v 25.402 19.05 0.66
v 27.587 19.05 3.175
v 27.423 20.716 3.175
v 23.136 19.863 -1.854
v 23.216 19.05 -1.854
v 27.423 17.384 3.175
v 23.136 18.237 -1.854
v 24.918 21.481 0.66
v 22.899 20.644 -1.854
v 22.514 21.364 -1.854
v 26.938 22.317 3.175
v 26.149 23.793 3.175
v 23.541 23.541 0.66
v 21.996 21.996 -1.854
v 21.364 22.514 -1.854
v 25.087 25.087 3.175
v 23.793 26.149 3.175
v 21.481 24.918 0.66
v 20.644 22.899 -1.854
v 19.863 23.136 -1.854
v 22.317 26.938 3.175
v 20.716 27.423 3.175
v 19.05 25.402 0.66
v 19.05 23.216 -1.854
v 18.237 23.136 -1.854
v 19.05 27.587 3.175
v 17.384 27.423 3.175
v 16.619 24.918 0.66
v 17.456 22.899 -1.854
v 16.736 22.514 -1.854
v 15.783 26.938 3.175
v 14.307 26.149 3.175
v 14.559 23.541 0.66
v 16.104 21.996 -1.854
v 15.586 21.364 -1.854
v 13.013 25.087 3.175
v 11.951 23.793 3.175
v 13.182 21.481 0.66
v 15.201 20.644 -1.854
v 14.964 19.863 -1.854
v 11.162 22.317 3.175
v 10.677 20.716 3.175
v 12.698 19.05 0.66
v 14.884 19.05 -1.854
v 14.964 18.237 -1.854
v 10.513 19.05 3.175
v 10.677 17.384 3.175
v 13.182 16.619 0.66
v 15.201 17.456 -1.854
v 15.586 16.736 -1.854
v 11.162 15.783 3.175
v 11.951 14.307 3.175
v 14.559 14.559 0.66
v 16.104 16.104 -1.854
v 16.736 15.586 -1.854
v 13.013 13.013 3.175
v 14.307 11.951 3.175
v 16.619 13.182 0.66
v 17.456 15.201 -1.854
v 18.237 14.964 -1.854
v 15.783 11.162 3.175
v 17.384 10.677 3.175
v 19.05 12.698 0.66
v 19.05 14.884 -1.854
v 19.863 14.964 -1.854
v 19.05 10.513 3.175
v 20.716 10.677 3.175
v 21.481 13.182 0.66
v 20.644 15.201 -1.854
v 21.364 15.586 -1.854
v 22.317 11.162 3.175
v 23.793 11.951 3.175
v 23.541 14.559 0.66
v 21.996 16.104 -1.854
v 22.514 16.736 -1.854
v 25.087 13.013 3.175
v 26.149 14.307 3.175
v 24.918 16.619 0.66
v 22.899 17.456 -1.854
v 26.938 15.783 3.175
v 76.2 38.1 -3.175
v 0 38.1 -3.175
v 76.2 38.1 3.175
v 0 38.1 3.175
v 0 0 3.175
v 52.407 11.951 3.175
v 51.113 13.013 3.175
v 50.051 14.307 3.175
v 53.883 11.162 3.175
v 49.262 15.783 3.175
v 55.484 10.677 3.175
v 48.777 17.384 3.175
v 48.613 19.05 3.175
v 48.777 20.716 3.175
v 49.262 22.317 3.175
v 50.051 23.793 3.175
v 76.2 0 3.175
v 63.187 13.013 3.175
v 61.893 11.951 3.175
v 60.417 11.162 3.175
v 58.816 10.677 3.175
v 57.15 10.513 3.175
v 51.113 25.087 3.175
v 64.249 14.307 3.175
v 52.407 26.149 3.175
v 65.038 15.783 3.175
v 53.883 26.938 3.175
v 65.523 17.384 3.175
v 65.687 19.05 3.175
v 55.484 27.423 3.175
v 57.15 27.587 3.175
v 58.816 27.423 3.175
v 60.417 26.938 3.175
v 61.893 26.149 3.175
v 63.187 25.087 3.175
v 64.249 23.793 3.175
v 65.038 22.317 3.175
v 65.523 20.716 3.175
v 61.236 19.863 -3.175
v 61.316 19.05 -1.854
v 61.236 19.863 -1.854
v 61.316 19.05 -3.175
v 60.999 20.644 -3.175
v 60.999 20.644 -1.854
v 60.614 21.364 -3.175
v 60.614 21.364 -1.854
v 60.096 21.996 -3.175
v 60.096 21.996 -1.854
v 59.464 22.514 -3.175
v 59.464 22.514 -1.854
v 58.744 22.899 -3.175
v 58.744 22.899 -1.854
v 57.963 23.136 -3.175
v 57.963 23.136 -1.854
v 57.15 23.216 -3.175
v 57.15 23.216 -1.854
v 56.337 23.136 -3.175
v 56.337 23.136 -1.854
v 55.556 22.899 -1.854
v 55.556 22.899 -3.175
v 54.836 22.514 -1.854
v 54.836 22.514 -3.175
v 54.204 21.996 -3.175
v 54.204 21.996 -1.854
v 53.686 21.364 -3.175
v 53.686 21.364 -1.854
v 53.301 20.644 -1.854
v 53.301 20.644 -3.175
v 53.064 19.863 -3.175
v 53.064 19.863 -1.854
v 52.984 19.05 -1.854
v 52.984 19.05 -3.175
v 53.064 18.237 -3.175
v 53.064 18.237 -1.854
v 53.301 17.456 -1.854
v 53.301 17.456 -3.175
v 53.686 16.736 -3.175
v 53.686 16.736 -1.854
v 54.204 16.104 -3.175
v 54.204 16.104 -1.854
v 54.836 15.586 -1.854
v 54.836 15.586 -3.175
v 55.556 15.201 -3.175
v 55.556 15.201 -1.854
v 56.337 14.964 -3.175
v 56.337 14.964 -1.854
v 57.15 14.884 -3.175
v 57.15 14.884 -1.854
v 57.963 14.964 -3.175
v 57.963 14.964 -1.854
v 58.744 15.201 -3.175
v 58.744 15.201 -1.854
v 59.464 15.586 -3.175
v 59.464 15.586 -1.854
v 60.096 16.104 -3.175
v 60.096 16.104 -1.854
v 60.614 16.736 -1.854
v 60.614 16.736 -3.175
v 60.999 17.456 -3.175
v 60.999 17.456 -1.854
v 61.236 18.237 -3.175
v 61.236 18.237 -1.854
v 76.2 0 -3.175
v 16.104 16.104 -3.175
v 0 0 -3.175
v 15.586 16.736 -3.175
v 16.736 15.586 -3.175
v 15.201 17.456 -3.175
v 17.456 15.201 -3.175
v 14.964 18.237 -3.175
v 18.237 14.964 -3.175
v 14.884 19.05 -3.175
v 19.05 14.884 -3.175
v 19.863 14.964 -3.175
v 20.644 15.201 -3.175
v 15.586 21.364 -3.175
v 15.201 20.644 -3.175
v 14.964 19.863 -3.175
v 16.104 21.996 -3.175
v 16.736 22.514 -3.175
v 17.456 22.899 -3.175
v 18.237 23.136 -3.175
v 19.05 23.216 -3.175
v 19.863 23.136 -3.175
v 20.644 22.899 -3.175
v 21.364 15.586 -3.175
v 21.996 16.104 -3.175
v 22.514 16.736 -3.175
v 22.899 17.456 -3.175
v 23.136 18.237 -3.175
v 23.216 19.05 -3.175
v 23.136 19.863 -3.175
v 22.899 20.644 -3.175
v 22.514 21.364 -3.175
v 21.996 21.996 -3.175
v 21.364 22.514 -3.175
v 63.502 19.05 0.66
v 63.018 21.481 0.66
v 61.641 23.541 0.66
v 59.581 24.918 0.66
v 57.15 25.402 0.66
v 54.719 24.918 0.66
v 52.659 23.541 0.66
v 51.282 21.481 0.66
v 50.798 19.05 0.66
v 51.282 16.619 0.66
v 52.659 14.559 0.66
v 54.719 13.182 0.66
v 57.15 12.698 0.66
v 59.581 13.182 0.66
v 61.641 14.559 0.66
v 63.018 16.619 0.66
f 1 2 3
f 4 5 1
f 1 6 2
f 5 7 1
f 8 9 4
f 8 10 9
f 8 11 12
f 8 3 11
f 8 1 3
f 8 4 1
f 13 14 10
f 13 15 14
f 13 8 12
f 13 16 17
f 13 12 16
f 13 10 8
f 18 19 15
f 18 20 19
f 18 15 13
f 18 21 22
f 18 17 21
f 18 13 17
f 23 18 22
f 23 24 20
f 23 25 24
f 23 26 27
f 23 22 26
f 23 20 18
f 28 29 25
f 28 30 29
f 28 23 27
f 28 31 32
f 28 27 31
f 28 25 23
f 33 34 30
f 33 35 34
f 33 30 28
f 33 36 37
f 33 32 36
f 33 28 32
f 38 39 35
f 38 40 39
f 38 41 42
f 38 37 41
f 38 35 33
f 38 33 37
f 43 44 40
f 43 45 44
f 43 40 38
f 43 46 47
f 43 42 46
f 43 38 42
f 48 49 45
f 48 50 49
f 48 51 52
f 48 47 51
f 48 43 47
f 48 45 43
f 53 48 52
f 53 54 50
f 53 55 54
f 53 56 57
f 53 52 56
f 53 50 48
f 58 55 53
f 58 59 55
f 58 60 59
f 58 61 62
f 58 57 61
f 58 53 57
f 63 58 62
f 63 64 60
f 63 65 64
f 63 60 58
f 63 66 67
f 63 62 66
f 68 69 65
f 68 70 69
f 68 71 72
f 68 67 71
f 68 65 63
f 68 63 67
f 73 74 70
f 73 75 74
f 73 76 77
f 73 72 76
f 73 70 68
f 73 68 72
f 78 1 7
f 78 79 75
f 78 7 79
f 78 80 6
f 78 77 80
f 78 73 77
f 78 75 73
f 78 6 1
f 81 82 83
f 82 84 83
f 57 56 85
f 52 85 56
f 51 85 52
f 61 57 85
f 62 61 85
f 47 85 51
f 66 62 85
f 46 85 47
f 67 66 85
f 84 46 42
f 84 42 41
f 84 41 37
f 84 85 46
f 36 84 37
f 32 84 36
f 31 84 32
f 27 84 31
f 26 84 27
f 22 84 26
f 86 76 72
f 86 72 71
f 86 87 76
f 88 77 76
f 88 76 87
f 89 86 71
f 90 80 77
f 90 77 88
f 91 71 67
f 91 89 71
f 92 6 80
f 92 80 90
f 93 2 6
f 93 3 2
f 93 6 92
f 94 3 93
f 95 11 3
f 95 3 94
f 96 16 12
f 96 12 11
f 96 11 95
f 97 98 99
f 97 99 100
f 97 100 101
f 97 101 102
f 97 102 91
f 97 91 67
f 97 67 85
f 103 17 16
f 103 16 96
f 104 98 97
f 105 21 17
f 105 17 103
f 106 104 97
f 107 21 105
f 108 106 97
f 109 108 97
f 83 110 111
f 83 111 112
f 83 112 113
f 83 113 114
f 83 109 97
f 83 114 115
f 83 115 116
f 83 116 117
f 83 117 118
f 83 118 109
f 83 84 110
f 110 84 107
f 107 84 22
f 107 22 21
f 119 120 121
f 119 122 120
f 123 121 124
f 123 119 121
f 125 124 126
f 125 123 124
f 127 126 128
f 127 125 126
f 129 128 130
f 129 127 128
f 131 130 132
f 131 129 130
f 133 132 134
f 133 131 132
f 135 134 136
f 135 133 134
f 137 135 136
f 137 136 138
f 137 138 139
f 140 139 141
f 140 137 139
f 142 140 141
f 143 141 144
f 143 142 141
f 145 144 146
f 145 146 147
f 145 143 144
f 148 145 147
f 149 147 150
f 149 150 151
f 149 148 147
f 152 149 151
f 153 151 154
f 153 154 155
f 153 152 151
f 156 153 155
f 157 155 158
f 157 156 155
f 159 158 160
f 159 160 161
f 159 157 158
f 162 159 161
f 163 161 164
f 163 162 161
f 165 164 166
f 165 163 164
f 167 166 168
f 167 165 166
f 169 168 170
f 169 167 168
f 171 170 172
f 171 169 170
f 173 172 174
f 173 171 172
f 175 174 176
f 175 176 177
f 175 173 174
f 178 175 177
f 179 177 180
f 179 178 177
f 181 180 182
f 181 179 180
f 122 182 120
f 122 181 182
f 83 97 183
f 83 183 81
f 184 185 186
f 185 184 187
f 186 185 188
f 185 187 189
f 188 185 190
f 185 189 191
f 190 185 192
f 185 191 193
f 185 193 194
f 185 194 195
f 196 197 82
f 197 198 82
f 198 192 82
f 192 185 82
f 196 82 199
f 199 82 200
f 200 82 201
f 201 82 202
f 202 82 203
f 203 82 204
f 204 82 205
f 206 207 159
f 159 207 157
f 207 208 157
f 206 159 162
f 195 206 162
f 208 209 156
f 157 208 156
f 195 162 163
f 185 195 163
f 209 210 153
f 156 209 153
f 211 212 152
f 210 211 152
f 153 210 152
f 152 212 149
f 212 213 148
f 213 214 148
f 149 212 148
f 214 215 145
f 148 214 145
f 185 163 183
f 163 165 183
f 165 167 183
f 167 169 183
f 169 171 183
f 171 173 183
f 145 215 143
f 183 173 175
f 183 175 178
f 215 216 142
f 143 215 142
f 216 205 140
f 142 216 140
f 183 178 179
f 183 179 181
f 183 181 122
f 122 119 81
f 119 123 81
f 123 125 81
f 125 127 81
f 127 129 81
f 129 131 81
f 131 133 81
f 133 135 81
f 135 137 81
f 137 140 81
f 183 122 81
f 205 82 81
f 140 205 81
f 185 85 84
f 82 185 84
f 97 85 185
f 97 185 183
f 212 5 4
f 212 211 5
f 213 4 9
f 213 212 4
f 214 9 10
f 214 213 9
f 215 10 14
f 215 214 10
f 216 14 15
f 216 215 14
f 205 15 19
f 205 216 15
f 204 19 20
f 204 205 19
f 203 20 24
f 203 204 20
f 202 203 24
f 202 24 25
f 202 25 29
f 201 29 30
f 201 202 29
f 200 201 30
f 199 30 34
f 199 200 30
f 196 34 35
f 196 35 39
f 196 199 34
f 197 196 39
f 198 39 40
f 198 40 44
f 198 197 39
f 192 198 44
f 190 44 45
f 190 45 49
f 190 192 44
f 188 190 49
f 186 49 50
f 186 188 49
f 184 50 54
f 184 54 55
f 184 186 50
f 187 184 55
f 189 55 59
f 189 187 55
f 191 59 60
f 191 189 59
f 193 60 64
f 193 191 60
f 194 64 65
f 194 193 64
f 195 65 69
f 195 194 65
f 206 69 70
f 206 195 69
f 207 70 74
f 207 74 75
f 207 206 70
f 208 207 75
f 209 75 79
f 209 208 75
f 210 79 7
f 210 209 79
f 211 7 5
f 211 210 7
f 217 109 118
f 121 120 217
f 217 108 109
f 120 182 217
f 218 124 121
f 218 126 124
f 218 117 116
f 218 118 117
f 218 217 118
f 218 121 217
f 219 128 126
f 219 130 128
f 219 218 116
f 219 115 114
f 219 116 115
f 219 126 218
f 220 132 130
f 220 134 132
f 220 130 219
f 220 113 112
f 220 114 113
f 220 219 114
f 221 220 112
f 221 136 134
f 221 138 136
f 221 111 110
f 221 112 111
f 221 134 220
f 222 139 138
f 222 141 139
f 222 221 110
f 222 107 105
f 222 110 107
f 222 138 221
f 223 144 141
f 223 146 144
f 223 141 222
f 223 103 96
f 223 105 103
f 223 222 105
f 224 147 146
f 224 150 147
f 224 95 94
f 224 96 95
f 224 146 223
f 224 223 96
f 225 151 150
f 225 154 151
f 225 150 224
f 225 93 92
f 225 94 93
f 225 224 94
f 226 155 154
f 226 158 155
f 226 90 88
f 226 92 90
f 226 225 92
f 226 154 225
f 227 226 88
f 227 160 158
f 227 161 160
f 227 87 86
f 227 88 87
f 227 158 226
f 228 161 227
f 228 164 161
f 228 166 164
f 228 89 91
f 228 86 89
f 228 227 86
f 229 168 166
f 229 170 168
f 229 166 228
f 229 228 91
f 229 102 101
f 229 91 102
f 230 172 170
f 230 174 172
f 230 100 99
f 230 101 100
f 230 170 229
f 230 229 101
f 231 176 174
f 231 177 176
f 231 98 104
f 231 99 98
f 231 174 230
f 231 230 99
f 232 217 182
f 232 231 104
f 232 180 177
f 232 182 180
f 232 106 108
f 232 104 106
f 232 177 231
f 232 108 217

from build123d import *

# Parameters (mm, degrees)
SKETCH1_W                    = 76.2
SKETCH1_H                    = 38.1
SKETCH1_R                    = 4.1656
BOSS_EXTRUDE1_DEPTH          = 3.175
CUT_EXTRUDE1_START           = -5.0292
SKETCH2_R                    = 4.1656
CUT_EXTRUDE1_DEPTH           = 91.459712699
CUT_EXTRUDE1_DRAFT           = -41
CUT_EXTRUDE1_PROFILE_2_DEPTH = 91.459712699
CUT_EXTRUDE1_PROFILE_2_DRAFT = -41


with BuildPart() as part:
    # Sketch1 → Boss-Extrude1 (new, symmetric)
    with BuildSketch(Plane.XY):
        with Locations((38.1, 19.05)):
            Rectangle(SKETCH1_W, SKETCH1_H)
        with Locations((19.05, 19.05)):
            Circle(SKETCH1_R, mode=Mode.SUBTRACT)
        with Locations((57.15, 19.05)):
            Circle(SKETCH1_R, mode=Mode.SUBTRACT)
    extrude(amount=BOSS_EXTRUDE1_DEPTH, both=True)


with BuildPart() as cut_extrude1_tool:
    # Sketch2 → Cut-Extrude1 (with draft: the straight prism first)
    with BuildSketch(Plane.XY.offset(3.175).offset(CUT_EXTRUDE1_START)):
        with Locations((19.05, 19.05)):
            Circle(SKETCH2_R)
    extrude(amount=CUT_EXTRUDE1_DEPTH)
    # Cut-Extrude1: the draft: its side faces are tilted about the plane it starts from
    cut_extrude1_sides = [cut_extrude1_tool.faces().sort_by_distance(p)[0] for p in [
        (14.8844, 19.05, 43.875656349),
    ]]
    draft(cut_extrude1_sides, Plane.XY.offset(3.175).offset(CUT_EXTRUDE1_START), CUT_EXTRUDE1_DRAFT)


with BuildPart() as part_1:
    add(part.part)

    # Cut-Extrude1: cut by cut_extrude1_tool
    add(cut_extrude1_tool.part, mode=Mode.SUBTRACT)


with BuildPart() as cut_extrude1_profile_2_tool:
    # Sketch2 → Cut-Extrude1 profile 2 (with draft: the straight prism first)
    with BuildSketch(Plane.XY.offset(3.175).offset(CUT_EXTRUDE1_START)):
        with Locations((57.15, 19.05)):
            Circle(SKETCH2_R)
    extrude(amount=CUT_EXTRUDE1_PROFILE_2_DEPTH)
    # Cut-Extrude1 profile 2: the draft: its side faces are tilted about the plane it starts from
    cut_extrude1_profile_2_sides = [cut_extrude1_profile_2_tool.faces().sort_by_distance(p)[0] for p in [
        (52.9844, 19.05, 43.875656349),
    ]]
    draft(cut_extrude1_profile_2_sides, Plane.XY.offset(3.175).offset(CUT_EXTRUDE1_START), CUT_EXTRUDE1_PROFILE_2_DRAFT)


with BuildPart() as part_2:
    add(part_1.part)

    # Cut-Extrude1 profile 2: cut by cut_extrude1_profile_2_tool
    add(cut_extrude1_profile_2_tool.part, mode=Mode.SUBTRACT)


solid = part_2.part
